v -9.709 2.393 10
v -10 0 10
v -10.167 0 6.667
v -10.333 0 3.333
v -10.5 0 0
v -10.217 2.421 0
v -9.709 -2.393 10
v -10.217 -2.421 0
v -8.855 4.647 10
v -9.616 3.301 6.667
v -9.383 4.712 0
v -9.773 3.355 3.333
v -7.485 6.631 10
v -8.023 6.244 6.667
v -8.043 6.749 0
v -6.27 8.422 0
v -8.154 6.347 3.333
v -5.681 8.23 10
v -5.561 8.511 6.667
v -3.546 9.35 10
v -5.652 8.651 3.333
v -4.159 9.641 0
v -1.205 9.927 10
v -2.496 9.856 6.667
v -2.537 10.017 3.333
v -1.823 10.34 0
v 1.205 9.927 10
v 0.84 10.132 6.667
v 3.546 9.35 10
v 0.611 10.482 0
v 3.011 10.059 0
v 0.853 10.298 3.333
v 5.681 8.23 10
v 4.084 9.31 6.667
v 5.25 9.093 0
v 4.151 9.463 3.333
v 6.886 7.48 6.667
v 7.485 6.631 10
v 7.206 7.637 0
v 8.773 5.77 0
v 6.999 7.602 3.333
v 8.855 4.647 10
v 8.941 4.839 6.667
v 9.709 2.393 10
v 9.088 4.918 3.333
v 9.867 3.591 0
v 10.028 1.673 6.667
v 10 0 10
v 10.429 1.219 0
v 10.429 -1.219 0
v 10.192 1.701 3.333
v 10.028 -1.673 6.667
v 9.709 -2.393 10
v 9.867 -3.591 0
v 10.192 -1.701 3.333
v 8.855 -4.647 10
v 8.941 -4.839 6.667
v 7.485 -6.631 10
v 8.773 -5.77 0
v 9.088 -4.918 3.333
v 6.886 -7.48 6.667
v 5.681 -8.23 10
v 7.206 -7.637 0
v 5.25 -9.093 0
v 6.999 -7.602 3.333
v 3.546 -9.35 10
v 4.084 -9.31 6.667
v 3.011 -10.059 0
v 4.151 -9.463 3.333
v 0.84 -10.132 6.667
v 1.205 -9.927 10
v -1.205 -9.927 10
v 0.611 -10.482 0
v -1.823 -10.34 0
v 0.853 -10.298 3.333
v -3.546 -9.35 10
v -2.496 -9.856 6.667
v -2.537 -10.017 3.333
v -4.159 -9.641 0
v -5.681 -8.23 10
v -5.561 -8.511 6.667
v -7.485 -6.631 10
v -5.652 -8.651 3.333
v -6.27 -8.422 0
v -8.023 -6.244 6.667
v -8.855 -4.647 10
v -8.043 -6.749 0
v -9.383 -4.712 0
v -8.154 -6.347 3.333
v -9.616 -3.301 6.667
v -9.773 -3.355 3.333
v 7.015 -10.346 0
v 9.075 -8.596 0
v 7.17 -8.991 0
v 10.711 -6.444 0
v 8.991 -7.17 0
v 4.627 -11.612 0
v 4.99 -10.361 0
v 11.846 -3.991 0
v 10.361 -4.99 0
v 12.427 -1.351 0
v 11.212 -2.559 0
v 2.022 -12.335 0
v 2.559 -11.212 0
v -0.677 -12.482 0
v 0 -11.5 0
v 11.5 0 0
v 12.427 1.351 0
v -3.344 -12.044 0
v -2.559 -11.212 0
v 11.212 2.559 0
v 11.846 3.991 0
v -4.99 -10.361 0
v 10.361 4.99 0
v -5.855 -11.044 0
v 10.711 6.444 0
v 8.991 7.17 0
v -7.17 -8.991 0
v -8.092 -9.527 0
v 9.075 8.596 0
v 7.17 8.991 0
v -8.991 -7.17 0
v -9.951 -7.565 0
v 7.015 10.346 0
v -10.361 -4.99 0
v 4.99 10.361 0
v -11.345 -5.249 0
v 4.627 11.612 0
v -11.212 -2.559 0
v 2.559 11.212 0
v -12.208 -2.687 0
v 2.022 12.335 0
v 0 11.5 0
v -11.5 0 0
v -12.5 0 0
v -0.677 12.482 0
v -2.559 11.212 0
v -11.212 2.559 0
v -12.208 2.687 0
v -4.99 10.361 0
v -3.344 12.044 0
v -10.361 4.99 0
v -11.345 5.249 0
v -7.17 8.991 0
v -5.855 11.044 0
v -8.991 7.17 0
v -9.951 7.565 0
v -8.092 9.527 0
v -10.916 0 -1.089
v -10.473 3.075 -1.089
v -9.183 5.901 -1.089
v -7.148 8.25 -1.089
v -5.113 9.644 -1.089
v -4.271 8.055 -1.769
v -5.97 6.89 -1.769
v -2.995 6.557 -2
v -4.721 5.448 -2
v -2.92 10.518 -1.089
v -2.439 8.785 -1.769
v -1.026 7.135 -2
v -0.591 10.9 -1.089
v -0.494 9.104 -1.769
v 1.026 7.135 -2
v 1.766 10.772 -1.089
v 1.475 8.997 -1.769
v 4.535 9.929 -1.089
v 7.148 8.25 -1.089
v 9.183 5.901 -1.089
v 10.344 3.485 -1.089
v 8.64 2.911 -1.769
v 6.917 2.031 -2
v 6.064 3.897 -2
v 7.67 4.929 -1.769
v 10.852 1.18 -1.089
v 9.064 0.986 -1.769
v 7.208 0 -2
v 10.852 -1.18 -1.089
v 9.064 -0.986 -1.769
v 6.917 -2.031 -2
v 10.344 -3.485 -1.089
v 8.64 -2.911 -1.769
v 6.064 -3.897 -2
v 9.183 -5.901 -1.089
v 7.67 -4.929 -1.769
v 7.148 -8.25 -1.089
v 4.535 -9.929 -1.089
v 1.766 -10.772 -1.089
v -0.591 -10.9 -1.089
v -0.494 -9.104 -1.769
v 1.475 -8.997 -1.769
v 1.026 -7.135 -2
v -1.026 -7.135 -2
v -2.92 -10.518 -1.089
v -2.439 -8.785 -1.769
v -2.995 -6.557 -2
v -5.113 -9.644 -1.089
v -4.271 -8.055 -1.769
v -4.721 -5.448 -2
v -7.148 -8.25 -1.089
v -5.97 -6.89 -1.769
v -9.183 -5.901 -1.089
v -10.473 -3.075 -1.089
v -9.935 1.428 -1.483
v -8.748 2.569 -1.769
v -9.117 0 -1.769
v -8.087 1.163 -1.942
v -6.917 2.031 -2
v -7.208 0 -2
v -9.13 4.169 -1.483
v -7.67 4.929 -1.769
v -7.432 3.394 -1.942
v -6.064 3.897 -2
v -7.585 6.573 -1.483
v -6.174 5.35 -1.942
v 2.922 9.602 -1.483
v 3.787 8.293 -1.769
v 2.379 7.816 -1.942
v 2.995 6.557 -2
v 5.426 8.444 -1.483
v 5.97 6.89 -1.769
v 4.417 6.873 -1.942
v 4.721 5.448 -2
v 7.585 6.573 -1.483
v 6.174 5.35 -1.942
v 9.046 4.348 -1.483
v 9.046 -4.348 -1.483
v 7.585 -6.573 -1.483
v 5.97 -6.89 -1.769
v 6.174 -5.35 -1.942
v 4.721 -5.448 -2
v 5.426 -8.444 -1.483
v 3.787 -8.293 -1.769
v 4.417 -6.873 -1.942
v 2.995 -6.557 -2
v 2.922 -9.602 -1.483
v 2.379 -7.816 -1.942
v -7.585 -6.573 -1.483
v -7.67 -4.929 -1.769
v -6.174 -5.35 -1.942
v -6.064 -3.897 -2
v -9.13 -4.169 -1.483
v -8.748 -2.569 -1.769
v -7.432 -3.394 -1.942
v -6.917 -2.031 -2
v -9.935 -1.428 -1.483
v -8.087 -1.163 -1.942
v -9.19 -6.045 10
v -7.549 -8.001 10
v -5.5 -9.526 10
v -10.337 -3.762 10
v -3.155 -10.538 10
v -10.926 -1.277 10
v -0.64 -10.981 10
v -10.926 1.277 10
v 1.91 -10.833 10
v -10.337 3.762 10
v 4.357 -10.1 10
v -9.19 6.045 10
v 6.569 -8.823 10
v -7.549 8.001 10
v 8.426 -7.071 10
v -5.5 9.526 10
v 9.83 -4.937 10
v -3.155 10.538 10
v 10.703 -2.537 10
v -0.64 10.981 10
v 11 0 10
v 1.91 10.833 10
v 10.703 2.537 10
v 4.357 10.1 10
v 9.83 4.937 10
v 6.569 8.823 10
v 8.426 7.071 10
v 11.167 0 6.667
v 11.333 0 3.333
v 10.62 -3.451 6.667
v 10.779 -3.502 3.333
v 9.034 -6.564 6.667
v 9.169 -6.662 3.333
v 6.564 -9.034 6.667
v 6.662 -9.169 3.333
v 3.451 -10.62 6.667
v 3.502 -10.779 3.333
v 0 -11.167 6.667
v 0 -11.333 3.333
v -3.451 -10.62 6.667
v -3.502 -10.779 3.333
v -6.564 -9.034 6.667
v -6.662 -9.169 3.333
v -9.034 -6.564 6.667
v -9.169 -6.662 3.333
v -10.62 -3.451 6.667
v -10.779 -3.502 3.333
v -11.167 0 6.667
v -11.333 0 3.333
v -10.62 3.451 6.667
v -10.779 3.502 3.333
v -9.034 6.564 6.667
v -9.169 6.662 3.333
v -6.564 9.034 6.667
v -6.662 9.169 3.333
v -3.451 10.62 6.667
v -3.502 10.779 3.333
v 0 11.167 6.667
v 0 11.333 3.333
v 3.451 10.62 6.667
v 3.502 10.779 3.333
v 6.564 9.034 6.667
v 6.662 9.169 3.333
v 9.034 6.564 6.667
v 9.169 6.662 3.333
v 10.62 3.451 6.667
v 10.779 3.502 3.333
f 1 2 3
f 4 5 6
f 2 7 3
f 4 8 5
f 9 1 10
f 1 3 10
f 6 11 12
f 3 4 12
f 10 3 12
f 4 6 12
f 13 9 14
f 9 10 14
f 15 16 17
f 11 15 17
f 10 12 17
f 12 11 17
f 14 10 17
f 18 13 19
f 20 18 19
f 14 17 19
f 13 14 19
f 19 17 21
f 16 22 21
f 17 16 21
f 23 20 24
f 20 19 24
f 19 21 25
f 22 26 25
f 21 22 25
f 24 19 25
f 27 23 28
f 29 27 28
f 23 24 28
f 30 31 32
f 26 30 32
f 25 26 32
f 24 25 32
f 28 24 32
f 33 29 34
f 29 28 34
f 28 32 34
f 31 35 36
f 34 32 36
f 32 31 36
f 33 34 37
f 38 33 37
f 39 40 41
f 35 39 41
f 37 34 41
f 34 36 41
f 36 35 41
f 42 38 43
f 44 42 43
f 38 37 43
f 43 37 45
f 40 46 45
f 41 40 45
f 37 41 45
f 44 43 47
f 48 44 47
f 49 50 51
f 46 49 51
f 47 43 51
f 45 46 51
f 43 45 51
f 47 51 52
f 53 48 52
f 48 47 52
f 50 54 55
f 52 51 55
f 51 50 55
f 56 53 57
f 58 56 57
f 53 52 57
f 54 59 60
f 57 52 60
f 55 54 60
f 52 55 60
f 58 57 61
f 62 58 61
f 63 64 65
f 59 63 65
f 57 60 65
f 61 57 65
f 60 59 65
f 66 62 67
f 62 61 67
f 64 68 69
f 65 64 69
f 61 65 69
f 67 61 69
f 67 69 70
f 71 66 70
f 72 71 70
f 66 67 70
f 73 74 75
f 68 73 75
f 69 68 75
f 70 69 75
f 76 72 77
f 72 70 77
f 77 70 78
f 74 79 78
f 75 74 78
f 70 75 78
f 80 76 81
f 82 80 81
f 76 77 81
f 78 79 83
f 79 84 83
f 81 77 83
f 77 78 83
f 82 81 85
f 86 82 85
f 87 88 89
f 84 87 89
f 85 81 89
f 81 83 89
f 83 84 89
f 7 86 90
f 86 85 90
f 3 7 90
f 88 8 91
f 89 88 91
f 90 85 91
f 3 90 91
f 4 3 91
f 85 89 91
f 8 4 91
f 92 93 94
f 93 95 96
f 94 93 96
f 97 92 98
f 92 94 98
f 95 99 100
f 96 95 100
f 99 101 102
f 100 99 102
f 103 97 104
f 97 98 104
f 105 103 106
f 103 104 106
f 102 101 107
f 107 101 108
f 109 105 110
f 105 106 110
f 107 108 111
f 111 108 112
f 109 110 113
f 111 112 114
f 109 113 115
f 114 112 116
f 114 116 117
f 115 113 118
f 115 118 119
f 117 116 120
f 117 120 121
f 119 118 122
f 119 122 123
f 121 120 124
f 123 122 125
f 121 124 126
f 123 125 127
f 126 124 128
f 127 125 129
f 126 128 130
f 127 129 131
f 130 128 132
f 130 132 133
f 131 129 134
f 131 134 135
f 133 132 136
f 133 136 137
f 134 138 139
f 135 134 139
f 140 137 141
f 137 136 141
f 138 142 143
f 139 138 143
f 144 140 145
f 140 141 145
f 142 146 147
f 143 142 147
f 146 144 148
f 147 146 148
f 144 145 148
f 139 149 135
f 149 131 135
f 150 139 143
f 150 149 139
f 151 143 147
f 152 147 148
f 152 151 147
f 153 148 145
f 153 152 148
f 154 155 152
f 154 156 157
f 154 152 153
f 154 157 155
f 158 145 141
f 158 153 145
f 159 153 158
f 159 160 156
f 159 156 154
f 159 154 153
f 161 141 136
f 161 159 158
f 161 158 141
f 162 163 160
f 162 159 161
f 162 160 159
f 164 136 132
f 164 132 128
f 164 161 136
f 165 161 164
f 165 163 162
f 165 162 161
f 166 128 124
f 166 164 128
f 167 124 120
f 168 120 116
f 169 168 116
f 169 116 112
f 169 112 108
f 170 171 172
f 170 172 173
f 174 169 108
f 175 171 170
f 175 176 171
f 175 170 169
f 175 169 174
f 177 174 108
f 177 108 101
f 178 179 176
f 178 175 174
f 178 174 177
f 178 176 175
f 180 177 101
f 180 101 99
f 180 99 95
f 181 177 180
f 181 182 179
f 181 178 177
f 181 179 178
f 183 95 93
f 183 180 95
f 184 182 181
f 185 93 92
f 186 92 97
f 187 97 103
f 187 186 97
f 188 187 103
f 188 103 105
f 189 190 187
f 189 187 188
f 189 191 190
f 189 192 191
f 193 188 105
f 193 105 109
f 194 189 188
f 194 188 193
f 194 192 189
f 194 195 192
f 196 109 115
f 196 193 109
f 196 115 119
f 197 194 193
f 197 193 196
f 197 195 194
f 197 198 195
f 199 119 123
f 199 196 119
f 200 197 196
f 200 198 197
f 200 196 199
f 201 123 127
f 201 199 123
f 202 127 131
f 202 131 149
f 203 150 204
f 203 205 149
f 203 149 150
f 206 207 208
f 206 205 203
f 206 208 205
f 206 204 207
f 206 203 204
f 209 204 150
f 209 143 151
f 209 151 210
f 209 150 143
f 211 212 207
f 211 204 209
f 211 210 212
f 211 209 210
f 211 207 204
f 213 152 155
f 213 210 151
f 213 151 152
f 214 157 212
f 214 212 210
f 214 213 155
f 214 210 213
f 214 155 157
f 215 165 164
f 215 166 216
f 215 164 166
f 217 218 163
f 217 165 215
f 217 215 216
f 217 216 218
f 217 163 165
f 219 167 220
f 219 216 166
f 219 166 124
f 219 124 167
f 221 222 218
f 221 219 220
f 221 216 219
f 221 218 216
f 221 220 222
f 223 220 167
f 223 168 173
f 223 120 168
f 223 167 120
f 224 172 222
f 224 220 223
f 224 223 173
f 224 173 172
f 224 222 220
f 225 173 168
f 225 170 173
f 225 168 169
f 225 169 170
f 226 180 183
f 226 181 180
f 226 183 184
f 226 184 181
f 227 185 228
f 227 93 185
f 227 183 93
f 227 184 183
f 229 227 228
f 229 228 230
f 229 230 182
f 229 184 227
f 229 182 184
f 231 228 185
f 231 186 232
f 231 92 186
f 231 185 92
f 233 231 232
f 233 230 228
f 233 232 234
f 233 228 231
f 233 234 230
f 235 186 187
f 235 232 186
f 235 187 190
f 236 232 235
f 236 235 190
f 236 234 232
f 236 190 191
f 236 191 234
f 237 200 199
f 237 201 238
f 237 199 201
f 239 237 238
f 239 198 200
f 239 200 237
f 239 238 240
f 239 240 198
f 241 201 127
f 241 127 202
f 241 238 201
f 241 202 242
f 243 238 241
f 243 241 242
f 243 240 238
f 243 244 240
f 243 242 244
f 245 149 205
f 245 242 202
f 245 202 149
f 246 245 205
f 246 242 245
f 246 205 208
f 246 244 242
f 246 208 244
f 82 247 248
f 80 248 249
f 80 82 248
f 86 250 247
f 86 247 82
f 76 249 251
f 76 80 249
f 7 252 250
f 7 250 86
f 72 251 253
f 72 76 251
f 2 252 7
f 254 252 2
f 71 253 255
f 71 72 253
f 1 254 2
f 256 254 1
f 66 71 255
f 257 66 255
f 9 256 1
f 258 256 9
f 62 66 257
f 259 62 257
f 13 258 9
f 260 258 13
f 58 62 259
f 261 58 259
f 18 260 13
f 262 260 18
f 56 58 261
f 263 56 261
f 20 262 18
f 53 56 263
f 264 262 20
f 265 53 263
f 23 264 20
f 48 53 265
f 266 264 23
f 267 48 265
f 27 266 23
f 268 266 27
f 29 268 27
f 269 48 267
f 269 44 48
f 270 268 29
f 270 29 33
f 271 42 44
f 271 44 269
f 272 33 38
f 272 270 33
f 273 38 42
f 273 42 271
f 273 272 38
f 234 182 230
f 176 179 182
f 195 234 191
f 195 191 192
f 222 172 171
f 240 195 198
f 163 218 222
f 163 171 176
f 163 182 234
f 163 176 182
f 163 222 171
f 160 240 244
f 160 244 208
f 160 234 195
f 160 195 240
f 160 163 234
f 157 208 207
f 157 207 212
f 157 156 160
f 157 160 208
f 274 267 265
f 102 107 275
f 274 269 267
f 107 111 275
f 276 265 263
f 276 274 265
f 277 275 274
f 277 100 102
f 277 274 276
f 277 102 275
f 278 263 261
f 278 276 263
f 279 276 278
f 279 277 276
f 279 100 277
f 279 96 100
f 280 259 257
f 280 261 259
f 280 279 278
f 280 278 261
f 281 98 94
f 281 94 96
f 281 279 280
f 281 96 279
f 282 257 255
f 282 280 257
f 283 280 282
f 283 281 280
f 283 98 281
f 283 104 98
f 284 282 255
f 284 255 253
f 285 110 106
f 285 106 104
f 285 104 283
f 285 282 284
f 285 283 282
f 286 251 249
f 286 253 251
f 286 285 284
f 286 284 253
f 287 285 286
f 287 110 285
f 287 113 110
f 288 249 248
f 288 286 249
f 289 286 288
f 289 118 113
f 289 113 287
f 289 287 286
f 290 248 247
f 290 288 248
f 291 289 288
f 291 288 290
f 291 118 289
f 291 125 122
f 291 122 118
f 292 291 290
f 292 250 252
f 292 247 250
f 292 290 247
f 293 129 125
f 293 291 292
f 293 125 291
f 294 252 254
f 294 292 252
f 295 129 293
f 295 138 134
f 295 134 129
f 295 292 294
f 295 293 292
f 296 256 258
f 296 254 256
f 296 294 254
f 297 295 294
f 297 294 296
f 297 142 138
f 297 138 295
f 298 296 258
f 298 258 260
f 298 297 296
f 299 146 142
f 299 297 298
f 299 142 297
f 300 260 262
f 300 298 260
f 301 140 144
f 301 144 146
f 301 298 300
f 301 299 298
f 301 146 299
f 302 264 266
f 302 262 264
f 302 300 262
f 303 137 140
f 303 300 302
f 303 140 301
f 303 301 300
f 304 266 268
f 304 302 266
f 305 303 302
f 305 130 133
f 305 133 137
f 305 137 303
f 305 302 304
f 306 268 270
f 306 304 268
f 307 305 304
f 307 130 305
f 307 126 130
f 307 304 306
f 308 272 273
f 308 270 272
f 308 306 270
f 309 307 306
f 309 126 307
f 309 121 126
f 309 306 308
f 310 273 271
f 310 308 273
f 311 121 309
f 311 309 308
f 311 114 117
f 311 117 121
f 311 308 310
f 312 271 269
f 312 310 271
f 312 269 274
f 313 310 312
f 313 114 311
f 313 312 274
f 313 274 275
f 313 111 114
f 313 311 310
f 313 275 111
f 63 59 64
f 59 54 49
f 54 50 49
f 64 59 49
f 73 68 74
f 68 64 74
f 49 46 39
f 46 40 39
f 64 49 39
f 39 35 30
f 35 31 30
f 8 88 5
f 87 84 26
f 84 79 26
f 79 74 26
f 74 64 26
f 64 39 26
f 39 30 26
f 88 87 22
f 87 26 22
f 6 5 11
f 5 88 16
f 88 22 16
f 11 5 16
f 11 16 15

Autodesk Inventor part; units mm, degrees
ref_plane "YZ Plane" through (0, 0, 0) normal (1, 0, 0) x (0, 1, 0)
ref_plane "XZ Plane" through (0, 0, 0) normal (0, 1, 0) x (-1, 0, 0)
sketch "Эскиз1" plane through (0, 0, 0) normal (0, 0, 1) x (1, 0, 0)
  circle A0 centre (0, 0) radius 11.5
  circle A1 centre (0, 0) radius 10.5
  dimension "d0" = 23
  dimension "d7" = 21
ref_plane "РабПлоскость1" through (0, 0, 10) normal (0, 0, 1) x (1, 0, 0)
sketch "Эскиз2" plane through (0, 0, 10) normal (0, 0, 1) x (1, 0, 0)
  circle A0 centre (0, 0) radius 11
  circle A1 centre (0, 0) radius 10
  dimension "d2" = 22
  dimension "d8" = 20
loft "Лофт1" add profiles "Эскиз1", "Эскиз2" contours A0 | A1 / A0 | A1
sketch "Эскиз4" plane through (0, 0, 0) normal (0, 0, -1) x (-1, 0, 0)
  circle A0 centre (0, 0) radius 10.5
  circle A1 centre (0, 0) radius 11.5 projected
  dimension "d10" = 21
sketch "Эскиз3" plane through (0, 0, 10) normal (0, 0, 1) x (1, 0, 0)
  circle A0 centre (0, 0) radius 10
  circle A1 centre (0, 0) radius 11 projected
  dimension "d9" = 20
loft "Лофт2" cut profiles "Эскиз4", "Эскиз3" contours A0 / A0
sketch "Эскиз5" plane through (0, 0, 0) normal (0, 0, -1) x (-1, 0, 0)
  circle A0 centre (0, 0) radius 12.5
  dimension "d15" = 25
extrude "Выдавливание1" add sketch "Эскиз5" along normal blind 2
fillet "Сопряжение1" radius 8 1 edges at (12.5, 0, -2)
properties part number "Стул ВВ"
